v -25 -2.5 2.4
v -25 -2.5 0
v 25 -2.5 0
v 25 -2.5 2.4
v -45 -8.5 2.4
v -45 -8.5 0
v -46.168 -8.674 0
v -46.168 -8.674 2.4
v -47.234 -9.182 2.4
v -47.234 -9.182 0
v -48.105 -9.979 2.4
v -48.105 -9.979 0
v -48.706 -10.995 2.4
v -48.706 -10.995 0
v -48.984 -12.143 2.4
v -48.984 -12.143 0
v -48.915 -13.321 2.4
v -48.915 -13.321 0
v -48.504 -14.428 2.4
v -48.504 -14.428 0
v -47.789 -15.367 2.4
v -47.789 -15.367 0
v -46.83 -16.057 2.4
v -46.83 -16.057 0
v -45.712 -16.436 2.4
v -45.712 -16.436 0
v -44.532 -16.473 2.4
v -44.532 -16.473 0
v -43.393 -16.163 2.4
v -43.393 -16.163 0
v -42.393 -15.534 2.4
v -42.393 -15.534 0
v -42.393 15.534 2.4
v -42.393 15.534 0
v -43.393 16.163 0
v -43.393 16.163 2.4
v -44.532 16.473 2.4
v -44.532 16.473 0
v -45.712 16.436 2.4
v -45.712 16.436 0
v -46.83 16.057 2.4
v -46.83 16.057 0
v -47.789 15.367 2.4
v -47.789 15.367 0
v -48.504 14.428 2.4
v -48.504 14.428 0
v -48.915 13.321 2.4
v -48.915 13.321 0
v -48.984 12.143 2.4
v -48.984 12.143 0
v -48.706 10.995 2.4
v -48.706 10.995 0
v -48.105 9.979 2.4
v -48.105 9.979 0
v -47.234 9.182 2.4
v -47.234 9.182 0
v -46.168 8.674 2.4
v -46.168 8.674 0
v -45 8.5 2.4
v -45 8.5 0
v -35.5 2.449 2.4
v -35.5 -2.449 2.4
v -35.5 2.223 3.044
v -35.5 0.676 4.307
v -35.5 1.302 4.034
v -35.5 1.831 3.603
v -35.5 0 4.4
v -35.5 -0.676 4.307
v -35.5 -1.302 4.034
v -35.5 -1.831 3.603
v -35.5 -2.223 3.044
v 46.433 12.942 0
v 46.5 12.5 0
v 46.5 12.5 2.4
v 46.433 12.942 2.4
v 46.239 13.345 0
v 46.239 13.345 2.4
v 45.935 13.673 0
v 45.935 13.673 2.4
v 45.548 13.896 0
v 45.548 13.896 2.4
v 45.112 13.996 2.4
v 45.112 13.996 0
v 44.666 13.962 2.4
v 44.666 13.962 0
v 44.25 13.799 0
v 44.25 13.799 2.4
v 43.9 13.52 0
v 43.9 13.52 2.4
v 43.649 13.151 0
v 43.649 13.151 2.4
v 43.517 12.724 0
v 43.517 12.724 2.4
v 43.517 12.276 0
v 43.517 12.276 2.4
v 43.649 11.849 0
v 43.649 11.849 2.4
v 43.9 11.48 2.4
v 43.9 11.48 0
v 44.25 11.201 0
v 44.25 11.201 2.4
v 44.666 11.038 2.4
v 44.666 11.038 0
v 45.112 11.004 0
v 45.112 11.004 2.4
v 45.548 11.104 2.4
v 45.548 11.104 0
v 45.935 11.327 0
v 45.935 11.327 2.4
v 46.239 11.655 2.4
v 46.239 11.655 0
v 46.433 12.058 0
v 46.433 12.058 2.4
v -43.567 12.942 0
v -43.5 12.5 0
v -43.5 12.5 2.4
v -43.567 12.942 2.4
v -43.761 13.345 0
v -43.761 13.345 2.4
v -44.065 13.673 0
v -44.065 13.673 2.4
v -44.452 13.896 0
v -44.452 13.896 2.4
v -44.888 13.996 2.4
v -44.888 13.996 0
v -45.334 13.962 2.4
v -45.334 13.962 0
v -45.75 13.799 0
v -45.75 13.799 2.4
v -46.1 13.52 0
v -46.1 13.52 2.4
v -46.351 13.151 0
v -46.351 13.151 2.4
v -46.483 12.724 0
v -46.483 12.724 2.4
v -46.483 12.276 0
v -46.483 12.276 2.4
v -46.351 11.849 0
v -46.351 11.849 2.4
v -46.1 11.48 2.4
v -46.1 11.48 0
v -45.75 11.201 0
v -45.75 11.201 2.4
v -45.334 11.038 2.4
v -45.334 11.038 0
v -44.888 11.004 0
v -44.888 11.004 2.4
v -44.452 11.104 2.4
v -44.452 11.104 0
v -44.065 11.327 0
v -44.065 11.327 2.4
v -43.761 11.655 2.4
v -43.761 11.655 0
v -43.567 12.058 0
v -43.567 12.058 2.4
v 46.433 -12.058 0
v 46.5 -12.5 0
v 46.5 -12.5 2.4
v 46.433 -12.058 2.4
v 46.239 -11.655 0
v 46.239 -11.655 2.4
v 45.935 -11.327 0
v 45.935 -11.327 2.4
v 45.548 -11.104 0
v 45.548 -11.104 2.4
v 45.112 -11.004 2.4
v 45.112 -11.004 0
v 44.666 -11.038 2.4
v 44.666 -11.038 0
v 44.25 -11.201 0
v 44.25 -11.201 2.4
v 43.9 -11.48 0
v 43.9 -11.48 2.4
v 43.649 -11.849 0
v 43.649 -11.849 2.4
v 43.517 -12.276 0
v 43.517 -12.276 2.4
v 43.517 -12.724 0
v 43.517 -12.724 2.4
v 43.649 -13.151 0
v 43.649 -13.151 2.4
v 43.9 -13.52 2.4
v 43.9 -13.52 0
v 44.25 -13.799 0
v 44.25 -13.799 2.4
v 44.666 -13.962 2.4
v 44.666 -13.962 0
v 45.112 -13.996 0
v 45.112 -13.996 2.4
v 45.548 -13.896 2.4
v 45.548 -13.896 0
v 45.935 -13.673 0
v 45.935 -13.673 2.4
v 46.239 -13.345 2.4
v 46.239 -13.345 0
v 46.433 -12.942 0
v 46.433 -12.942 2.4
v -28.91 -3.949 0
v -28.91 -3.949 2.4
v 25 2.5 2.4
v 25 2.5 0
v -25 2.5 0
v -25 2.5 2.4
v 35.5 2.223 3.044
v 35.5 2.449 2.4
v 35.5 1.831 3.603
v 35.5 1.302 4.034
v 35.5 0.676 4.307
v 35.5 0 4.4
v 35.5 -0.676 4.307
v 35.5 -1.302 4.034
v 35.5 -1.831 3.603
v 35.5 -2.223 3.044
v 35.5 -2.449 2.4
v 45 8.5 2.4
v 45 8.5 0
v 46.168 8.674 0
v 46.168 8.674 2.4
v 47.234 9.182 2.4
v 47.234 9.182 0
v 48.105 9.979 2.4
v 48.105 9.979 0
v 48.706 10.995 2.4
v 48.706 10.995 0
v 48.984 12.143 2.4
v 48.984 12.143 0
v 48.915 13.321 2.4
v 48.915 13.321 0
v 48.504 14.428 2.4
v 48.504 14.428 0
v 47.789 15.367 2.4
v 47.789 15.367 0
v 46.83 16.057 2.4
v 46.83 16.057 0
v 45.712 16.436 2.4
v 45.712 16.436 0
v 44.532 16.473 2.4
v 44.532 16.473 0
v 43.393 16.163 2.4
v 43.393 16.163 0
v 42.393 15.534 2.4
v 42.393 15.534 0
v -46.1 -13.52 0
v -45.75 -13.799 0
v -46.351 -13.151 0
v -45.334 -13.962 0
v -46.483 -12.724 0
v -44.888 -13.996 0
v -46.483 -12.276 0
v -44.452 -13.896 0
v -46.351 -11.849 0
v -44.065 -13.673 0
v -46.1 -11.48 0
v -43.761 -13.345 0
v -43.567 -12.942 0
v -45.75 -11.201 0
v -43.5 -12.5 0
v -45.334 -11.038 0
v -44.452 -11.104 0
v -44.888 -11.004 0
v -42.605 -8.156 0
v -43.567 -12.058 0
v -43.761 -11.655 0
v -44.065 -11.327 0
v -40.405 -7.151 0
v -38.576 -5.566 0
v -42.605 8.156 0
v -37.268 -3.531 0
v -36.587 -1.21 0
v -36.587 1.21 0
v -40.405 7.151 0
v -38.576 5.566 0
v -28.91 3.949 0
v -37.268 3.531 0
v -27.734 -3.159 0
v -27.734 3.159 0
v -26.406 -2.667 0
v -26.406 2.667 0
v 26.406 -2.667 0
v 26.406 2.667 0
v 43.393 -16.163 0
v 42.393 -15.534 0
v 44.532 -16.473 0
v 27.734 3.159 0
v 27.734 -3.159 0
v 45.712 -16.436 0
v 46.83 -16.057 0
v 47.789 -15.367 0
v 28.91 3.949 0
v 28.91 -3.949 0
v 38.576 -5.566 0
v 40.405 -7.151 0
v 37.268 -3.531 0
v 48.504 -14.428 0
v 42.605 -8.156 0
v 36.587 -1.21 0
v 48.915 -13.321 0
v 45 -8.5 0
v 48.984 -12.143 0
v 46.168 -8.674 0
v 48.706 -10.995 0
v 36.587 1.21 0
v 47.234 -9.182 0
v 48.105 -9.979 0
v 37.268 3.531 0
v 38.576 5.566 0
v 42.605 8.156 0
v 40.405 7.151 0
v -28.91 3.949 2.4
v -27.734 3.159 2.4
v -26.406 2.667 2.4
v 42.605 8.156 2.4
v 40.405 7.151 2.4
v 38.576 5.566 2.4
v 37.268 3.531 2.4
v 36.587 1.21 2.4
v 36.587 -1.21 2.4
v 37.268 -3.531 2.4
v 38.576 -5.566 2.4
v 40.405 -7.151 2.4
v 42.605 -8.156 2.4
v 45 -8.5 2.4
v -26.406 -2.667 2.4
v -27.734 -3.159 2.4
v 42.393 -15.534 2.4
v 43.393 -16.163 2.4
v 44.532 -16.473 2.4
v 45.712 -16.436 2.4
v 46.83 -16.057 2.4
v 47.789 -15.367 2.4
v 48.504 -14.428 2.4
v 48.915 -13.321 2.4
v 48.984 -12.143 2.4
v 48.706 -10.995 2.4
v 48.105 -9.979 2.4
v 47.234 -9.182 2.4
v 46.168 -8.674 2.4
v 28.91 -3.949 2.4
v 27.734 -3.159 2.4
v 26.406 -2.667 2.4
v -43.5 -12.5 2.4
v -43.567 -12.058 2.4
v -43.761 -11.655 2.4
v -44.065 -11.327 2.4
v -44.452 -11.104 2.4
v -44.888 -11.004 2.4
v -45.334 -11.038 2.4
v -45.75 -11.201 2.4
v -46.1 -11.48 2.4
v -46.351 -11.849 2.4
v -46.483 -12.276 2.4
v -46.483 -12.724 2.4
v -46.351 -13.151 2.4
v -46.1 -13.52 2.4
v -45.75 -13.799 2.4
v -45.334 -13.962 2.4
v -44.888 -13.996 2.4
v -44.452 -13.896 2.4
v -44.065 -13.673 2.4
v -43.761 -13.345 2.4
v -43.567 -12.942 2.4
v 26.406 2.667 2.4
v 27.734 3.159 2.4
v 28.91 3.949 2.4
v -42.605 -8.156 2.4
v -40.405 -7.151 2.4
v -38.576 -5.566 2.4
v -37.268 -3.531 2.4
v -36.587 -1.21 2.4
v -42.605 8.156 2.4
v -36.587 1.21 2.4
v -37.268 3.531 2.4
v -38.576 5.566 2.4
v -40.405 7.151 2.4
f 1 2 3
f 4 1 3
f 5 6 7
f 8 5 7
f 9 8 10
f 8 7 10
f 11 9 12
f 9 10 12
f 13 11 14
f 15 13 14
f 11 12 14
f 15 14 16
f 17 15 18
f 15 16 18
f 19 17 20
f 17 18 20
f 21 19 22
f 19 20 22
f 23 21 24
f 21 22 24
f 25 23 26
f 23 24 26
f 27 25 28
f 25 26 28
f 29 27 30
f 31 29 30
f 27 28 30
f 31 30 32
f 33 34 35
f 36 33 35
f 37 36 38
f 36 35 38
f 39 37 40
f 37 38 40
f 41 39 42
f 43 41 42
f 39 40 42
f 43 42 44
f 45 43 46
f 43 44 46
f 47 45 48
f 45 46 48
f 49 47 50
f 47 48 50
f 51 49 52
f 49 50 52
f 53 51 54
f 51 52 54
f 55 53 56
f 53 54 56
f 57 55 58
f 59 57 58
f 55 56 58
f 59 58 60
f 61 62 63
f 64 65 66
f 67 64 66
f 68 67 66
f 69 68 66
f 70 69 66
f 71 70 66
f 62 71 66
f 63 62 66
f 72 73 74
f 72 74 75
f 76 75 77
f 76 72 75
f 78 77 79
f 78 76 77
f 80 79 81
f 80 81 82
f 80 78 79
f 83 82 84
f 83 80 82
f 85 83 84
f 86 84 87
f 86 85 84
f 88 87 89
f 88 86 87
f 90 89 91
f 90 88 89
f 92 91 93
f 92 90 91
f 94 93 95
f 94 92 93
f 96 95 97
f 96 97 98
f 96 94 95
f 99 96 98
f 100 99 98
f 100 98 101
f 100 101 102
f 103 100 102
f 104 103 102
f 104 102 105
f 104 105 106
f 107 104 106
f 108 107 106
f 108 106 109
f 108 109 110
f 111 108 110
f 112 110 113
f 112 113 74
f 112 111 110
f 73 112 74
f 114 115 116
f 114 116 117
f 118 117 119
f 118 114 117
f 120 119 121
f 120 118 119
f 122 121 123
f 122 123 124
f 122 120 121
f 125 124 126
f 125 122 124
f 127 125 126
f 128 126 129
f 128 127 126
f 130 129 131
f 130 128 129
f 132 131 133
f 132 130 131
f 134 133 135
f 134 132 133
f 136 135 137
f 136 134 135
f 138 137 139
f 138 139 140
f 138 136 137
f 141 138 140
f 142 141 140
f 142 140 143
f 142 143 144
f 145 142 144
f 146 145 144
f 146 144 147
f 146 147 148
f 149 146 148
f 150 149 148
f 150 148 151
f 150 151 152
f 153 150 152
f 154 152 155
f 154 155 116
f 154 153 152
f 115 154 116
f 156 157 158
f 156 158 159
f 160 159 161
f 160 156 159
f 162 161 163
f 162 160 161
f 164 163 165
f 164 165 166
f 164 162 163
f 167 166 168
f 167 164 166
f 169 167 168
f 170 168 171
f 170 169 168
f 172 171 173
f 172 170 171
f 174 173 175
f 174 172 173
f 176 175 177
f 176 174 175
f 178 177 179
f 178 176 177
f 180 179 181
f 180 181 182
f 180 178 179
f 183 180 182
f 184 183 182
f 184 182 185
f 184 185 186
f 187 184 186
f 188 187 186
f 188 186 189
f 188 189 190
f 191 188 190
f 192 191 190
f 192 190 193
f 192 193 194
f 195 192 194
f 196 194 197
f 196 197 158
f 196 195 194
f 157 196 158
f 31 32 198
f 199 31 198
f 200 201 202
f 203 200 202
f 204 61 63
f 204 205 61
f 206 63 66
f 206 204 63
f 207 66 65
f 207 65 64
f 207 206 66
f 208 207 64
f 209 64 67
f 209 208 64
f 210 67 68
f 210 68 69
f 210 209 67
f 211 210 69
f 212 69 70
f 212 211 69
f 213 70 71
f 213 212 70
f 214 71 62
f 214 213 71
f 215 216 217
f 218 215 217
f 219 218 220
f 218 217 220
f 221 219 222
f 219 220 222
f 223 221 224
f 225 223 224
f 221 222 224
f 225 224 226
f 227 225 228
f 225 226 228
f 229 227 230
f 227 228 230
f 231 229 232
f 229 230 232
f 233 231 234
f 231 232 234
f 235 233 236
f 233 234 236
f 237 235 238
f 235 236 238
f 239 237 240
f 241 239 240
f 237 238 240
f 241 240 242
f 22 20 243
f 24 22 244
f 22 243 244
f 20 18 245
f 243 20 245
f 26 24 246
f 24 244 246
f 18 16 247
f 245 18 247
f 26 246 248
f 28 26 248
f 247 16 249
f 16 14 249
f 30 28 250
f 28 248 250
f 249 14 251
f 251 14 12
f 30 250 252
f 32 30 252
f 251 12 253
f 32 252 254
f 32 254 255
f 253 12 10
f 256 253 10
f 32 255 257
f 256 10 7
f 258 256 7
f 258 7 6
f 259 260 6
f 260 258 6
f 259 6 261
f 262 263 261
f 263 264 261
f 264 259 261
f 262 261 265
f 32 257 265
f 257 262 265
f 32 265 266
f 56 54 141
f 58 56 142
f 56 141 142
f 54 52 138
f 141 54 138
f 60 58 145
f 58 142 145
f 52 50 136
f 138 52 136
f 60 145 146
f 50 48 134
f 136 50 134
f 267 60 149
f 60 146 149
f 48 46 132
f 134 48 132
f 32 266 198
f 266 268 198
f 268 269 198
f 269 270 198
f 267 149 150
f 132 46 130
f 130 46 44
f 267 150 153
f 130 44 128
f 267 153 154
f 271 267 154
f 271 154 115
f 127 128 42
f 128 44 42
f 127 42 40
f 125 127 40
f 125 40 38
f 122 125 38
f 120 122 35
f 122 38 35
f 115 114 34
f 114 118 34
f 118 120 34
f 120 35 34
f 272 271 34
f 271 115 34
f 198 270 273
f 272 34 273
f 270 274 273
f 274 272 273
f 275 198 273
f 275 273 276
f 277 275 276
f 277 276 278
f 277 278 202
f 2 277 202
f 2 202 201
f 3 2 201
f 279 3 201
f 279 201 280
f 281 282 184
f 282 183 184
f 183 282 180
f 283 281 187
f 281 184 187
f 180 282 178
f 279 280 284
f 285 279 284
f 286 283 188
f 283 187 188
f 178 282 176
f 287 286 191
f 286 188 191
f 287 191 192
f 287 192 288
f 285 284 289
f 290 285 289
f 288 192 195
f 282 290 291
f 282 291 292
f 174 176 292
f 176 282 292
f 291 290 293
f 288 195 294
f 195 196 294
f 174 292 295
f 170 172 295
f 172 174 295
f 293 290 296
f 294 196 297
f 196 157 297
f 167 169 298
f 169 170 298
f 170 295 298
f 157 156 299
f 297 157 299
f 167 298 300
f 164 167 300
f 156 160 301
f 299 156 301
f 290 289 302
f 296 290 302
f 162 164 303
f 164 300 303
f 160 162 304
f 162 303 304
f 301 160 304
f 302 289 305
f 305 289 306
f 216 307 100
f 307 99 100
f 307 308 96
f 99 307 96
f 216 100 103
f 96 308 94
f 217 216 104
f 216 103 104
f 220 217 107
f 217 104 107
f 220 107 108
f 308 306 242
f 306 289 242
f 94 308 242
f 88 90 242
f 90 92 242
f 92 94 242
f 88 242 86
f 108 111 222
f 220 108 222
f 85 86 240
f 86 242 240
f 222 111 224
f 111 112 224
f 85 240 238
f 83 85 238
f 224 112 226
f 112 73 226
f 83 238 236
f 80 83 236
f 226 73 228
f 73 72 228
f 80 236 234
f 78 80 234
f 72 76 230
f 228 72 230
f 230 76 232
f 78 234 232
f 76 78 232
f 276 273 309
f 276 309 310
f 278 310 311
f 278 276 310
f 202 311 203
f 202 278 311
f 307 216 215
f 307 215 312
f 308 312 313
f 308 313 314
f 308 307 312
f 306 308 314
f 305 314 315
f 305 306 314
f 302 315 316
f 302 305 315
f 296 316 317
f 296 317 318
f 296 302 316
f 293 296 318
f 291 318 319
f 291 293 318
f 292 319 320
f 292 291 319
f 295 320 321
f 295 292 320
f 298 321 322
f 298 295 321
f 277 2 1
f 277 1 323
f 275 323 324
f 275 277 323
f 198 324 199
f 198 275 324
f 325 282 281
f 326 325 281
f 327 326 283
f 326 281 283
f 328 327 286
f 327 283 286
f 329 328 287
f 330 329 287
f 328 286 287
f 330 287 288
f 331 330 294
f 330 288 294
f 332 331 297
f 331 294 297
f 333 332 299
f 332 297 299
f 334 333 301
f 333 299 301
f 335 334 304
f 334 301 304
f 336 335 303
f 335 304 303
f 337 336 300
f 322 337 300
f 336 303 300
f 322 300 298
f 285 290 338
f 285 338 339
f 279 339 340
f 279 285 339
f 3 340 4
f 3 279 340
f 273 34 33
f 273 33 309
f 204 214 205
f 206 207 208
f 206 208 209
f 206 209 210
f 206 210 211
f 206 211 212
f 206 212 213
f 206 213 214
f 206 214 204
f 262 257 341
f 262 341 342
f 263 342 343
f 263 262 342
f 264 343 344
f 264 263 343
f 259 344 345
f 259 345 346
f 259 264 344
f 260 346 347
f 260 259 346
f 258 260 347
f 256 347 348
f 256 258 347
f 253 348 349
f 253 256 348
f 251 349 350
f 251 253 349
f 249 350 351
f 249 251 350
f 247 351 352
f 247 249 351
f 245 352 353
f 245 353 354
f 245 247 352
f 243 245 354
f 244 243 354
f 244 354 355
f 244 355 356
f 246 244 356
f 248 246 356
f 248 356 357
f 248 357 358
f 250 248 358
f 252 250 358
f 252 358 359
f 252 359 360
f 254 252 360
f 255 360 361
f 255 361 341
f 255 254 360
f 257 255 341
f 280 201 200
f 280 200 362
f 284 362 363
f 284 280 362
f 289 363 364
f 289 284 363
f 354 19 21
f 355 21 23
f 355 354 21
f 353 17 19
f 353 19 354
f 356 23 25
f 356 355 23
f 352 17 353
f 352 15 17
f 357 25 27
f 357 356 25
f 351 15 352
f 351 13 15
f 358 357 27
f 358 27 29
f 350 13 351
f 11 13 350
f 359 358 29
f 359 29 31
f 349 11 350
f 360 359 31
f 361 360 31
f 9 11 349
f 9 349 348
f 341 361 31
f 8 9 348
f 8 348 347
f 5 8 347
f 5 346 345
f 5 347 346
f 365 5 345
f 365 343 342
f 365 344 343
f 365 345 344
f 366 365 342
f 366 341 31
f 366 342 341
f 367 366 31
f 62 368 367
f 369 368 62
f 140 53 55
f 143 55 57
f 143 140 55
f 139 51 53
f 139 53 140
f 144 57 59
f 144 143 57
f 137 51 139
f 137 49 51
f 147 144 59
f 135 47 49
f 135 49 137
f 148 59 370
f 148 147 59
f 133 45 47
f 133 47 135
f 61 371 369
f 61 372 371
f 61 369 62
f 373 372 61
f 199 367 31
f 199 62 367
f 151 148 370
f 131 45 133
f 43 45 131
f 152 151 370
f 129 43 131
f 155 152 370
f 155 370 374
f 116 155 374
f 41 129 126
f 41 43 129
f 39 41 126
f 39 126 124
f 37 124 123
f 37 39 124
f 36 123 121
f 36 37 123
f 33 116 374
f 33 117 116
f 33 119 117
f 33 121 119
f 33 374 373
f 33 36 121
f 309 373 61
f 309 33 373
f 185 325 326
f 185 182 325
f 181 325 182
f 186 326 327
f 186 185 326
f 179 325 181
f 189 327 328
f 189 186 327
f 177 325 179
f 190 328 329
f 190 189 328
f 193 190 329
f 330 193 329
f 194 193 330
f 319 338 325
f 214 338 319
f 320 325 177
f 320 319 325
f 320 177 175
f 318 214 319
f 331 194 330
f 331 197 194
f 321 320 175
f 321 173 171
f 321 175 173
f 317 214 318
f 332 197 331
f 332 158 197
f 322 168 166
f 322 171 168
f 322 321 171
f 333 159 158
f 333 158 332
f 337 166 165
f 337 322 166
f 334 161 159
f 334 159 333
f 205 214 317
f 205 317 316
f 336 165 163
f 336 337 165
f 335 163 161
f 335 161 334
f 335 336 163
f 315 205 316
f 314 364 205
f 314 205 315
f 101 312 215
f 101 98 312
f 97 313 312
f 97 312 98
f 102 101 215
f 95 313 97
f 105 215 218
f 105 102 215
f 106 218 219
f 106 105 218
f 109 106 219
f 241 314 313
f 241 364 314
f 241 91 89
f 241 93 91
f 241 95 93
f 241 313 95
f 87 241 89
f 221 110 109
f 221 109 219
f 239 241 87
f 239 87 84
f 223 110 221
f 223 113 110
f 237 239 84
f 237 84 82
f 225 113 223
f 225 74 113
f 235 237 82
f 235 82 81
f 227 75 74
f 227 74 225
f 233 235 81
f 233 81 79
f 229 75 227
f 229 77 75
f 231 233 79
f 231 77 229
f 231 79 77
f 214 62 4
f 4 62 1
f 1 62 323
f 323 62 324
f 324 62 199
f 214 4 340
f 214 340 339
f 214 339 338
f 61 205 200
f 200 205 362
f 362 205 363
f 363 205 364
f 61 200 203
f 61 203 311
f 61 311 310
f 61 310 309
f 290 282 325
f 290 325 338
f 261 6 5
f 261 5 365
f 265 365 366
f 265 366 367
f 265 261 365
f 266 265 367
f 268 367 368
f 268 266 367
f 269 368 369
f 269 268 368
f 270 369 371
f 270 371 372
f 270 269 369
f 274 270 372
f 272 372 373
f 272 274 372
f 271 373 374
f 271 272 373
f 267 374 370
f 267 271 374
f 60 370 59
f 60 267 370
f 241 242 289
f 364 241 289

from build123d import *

# Parameters (mm, degrees)
SKETCH003_R  = 1.5
PAD001_DEPTH = 2.4
PAD002_DEPTH = 35.5


with BuildPart() as part:
    # Sketch003 → Pad001 (new body)
    with BuildSketch(Plane.XY):
        with BuildLine():
            ThreePointArc((42.393216, -15.533921), (48.750712, -13.890021), (45, -8.5))
            ThreePointArc((45, 8.5), (36.5, 0), (45, -8.5))
            ThreePointArc((45, 8.5), (48.750712, 13.890021), (42.393216, 15.533921))
            Line((42.393216, 15.533921), (28.910176, 3.949119))
            ThreePointArc((25, 2.5), (27.085031, 2.873932), (28.910176, 3.949119))
            Line((25, 2.5), (-25, 2.5))
            ThreePointArc((-28.910176, 3.949119), (-27.085031, 2.873932), (-25, 2.5))
            Line((-42.393216, 15.533921), (-28.910176, 3.949119))
            ThreePointArc((-42.393216, 15.533921), (-48.750712, 13.890021), (-45, 8.5))
            ThreePointArc((-45, -8.5), (-36.5, 0), (-45, 8.5))
            ThreePointArc((-45, -8.5), (-48.750712, -13.890021), (-42.393216, -15.533921))
            Line((-42.393216, -15.533921), (-28.910176, -3.949119))
            ThreePointArc((-25, -2.5), (-27.085031, -2.873932), (-28.910176, -3.949119))
            Line((-25, -2.5), (25, -2.5))
            ThreePointArc((28.910176, -3.949119), (27.085031, -2.873932), (25, -2.5))
            Line((42.393216, -15.533921), (28.910176, -3.949119))
        make_face()
        with Locations((-45, 12.5)):
            Circle(SKETCH003_R, mode=Mode.SUBTRACT)
        with Locations((-45, -12.5)):
            Circle(SKETCH003_R, mode=Mode.SUBTRACT)
        with Locations((45, 12.5)):
            Circle(SKETCH003_R, mode=Mode.SUBTRACT)
        with Locations((45, -12.5)):
            Circle(SKETCH003_R, mode=Mode.SUBTRACT)
    extrude(amount=PAD001_DEPTH)

    # Sketch004 → Pad002 (join, symmetric)
    with BuildSketch(Plane.YZ):
        with BuildLine():
            ThreePointArc((2.44949, 2.4), (0, 4.4), (-2.44949, 2.4))
            Line((2.44949, 2.4), (-2.44949, 2.4))
        make_face()
    extrude(amount=PAD002_DEPTH, both=True)


solid = part.part
